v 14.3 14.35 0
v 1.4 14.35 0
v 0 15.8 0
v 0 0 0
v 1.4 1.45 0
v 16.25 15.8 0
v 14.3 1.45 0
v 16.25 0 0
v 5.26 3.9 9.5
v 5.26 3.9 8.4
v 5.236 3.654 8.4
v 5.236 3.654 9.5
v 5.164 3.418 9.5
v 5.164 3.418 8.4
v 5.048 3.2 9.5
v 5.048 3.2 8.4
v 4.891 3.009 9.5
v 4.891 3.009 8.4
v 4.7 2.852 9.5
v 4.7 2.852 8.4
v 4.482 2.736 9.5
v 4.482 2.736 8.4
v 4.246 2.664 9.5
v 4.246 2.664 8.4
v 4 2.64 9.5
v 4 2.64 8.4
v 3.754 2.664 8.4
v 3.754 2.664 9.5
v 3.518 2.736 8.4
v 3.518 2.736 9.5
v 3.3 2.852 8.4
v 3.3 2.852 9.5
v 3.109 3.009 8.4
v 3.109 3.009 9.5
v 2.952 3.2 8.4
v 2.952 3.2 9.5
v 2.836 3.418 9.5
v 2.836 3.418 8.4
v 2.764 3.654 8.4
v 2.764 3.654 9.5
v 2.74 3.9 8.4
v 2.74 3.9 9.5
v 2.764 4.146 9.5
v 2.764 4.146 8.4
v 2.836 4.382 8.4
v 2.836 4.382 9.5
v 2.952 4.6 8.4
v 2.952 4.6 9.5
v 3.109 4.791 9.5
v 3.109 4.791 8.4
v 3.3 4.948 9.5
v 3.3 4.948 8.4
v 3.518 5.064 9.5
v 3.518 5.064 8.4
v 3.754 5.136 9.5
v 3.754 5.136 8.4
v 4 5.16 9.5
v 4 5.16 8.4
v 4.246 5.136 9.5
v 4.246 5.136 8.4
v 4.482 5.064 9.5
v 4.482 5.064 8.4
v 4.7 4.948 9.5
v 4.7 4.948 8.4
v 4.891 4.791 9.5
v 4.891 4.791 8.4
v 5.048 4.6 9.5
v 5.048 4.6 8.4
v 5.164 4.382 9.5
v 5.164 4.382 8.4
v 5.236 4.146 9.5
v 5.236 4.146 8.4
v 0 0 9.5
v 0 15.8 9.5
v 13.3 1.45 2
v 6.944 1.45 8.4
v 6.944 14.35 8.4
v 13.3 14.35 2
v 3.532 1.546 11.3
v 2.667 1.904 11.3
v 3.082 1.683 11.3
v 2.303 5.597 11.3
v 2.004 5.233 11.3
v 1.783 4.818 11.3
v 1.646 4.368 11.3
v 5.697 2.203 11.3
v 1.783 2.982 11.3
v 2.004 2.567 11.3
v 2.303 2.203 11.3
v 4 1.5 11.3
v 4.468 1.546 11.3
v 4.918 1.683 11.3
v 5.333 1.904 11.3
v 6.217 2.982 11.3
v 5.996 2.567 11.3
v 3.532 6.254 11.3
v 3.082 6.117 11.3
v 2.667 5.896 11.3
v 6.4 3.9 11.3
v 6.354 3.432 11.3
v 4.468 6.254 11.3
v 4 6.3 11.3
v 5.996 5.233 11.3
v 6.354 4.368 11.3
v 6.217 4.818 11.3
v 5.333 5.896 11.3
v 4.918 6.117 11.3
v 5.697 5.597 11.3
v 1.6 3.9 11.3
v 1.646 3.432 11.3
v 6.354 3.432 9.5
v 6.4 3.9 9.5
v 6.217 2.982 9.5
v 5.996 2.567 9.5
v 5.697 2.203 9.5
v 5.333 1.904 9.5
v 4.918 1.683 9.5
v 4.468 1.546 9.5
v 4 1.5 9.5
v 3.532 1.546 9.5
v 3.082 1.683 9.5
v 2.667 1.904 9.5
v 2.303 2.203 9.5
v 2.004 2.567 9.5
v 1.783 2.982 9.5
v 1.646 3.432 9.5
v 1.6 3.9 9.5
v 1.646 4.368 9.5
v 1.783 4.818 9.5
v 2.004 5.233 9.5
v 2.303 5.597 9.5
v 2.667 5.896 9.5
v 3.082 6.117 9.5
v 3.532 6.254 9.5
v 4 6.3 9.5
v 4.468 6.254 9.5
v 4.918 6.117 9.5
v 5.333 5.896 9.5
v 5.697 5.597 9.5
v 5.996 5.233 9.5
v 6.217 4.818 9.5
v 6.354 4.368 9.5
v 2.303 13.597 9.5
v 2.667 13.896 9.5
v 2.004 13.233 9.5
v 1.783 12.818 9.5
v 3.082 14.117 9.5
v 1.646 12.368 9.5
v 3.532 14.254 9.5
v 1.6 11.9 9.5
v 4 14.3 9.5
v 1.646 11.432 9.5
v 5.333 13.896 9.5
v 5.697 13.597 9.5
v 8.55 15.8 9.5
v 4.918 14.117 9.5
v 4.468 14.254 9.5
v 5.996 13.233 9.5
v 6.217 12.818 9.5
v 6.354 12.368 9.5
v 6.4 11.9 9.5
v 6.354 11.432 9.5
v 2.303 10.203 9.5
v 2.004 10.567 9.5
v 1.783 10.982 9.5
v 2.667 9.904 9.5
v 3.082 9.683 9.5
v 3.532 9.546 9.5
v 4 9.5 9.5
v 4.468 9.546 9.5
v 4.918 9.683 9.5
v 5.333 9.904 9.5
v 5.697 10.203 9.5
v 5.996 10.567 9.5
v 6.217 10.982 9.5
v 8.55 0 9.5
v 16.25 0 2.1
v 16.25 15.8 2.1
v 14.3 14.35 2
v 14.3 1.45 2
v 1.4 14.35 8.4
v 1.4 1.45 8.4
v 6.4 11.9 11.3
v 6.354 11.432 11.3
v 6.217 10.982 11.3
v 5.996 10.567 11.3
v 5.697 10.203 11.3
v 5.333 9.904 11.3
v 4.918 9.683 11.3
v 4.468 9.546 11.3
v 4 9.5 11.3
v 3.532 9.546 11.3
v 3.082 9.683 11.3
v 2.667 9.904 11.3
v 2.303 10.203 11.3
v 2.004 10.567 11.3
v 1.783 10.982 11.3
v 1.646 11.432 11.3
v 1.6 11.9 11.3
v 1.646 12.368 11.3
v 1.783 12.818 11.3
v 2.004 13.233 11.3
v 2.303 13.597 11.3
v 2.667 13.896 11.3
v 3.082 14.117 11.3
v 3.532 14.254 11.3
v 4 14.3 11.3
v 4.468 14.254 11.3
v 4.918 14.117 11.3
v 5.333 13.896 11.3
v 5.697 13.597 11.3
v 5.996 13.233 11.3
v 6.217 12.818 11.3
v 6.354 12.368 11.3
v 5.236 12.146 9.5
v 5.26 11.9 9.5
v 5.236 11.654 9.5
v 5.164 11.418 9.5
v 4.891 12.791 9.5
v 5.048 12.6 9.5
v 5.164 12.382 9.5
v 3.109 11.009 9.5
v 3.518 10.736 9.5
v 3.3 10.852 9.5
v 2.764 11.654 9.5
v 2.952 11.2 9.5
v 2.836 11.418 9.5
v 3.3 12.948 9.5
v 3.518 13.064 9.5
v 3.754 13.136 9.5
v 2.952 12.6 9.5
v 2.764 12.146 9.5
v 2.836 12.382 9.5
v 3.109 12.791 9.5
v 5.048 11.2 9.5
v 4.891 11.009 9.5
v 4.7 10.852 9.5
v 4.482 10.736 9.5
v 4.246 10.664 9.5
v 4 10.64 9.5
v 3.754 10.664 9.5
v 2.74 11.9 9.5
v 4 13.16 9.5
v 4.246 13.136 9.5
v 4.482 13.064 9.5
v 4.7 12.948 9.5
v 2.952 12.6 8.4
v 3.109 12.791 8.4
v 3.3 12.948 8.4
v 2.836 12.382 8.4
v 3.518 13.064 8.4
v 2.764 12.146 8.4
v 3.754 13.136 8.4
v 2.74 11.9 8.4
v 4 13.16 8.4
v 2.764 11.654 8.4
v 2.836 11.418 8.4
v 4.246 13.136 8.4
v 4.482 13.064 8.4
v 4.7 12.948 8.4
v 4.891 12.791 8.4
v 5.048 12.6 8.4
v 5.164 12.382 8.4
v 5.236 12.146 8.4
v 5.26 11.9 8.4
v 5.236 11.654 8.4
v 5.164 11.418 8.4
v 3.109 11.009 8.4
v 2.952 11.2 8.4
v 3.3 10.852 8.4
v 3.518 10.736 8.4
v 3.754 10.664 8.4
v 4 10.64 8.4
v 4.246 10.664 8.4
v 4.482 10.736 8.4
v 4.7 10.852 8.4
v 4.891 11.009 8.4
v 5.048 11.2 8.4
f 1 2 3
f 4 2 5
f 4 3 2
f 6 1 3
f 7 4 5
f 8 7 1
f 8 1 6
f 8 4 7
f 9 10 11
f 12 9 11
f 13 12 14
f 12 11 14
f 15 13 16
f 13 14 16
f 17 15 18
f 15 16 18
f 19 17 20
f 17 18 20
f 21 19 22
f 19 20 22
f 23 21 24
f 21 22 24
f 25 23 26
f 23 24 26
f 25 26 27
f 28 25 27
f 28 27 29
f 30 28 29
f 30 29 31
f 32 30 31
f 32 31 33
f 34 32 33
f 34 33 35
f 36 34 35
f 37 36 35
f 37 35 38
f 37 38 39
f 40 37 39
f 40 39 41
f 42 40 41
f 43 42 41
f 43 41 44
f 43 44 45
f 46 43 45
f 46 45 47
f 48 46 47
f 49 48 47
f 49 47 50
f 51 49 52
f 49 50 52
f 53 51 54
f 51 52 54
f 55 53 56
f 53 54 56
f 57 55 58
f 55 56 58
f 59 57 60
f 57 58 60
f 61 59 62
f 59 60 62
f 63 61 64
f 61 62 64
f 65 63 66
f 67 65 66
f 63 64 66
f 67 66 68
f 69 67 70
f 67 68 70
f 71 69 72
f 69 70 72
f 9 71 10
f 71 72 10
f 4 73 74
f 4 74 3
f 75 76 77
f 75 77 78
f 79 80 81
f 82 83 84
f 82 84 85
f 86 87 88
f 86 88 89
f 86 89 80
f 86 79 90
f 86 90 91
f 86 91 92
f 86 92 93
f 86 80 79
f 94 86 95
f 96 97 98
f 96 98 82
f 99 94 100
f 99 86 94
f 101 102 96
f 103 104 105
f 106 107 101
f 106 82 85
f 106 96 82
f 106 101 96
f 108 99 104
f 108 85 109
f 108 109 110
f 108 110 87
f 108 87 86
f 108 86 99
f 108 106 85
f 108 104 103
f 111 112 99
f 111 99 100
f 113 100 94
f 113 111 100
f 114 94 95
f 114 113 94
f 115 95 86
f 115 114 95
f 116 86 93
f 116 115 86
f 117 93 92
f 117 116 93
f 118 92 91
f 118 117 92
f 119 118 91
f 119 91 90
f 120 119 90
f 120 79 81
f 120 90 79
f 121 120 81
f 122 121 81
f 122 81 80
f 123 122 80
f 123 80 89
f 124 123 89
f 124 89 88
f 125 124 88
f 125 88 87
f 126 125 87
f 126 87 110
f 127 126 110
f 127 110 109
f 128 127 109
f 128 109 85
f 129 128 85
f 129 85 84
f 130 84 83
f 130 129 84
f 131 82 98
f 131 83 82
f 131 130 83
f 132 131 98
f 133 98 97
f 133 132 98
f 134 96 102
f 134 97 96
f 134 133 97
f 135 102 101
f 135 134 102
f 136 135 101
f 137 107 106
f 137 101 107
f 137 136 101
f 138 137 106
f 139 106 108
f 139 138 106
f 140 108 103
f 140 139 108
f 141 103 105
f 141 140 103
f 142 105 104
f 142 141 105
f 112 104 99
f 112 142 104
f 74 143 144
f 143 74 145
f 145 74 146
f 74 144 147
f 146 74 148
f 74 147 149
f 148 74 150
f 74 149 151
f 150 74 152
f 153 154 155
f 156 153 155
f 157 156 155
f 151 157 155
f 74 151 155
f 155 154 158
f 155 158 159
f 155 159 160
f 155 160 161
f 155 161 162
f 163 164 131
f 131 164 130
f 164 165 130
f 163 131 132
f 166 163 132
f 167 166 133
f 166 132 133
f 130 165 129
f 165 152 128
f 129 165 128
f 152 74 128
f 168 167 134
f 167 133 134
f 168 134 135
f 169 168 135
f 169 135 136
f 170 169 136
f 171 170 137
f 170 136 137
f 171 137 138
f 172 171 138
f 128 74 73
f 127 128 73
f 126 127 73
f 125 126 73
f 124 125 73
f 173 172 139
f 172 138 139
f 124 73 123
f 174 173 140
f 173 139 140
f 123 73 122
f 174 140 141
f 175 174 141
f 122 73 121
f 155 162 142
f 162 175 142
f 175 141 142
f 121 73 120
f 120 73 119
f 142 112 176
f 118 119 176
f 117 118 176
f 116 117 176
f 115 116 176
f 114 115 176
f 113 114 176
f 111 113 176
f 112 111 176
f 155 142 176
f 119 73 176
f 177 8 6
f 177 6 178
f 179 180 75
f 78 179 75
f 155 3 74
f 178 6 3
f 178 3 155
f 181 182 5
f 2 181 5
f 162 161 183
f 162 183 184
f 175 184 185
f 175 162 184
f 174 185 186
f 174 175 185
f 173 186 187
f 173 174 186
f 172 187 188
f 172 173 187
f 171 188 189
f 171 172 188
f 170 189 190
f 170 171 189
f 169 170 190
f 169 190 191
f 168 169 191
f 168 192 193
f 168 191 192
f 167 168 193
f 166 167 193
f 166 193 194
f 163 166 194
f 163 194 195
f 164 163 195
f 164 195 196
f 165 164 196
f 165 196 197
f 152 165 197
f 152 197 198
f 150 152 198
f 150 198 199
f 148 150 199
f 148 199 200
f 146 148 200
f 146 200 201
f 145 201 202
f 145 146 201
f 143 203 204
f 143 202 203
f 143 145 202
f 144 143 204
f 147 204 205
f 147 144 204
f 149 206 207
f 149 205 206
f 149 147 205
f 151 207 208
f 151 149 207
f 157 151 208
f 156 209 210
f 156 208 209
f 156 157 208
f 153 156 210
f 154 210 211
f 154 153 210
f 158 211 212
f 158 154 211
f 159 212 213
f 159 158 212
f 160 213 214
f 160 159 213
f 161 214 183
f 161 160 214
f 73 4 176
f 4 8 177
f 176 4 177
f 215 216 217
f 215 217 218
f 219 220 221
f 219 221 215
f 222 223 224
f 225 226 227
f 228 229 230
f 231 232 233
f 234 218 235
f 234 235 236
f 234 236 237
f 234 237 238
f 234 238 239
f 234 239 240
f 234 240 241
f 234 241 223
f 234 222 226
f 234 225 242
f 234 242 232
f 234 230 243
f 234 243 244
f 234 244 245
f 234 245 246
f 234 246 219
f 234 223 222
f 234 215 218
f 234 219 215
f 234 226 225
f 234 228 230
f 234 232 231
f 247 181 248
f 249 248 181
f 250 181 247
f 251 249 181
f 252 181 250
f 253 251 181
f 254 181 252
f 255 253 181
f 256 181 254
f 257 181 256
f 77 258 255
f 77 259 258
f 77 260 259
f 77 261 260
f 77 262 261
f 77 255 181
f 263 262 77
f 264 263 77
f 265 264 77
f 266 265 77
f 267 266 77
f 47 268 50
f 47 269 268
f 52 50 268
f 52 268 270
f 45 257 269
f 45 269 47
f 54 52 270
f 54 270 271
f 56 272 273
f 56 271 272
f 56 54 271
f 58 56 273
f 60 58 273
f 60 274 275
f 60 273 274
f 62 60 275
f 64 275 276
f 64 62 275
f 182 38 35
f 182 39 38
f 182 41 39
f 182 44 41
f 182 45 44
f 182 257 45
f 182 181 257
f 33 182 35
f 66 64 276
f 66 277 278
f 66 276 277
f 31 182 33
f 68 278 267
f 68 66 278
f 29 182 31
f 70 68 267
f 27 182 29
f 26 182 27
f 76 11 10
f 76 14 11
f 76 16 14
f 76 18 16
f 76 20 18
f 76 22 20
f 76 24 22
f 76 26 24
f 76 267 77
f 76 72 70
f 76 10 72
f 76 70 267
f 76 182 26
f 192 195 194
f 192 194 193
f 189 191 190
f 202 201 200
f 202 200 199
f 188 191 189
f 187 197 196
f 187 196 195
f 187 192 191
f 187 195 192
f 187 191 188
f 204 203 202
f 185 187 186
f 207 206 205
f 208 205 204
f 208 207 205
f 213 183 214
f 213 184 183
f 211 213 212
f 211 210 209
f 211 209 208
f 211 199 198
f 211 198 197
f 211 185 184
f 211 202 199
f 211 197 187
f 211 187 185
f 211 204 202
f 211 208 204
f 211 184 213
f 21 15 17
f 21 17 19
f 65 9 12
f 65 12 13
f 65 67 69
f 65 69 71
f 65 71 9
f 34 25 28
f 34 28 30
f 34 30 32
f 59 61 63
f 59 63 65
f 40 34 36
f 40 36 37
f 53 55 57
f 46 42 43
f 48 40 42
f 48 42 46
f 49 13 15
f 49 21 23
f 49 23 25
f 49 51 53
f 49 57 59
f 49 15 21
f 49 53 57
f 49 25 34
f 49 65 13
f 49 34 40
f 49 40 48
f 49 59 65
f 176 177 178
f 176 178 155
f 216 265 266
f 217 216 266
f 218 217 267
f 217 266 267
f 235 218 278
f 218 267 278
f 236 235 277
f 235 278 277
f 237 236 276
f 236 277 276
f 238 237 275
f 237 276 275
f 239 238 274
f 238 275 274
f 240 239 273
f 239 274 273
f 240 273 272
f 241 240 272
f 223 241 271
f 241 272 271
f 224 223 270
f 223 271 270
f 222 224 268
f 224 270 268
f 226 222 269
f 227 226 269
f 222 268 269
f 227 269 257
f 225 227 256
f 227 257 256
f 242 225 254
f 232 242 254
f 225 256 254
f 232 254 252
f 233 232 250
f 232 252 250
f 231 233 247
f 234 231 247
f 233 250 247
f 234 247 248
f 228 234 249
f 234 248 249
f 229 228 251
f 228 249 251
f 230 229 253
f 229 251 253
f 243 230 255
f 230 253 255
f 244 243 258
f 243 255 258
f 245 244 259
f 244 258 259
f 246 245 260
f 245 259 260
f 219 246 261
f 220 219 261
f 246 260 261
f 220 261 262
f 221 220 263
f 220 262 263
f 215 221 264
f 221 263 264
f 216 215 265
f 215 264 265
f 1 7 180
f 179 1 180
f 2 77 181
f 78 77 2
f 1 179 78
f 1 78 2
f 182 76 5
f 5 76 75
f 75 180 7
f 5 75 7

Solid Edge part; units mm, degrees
sketch "Sketch1" plane through (0, 0, 0) normal (0, -1, 0) x (1, 0, 0)
  line L0 (0, 9.5) -> (8.55, 9.5)
  line L1 (16.25, 2.1) -> (8.55, 9.5)
  line L2 (16.25, 0) -> (16.25, 2.1)
  line L3 (0, 0) -> (16.25, 0)
  line L4 (0, 9.5) -> (0, 0)
  dimension "D1" = 8.55
  dimension "D2" = 2.1
extrude "Protrusion1" add sketch "Sketch1" against normal blind 15.8
sketch "Sketch2" plane through (8.125, 1.45, 4.75) normal (0, -1, 0) x (1, 0, 0)
  line L0 (6.175, -4.75) -> (6.175, -2.75)
  line L1 (6.175, -2.75) -> (5.175, -2.75)
  line L2 (-1.1815, 3.65) -> (5.175, -2.75)
  line L3 (-6.725, 3.65) -> (-1.1815, 3.65)
  line L4 (-6.725, 3.65) -> (-6.725, -4.75)
  line L5 (-6.725, -4.75) -> (6.175, -4.75)
  dimension "D1" = 2
  dimension "D2" = 1
extrude "ExtrudedCutout_1" cut sketch "Sketch2" against normal blind 12.9
sketch "Sketch3" plane through (4.275, 7.9, 9.5) normal (0, 0, 1) x (1, 0, 0)
  circle A0 centre (-0.275, 4) radius 2.4
  circle A1 centre (-0.275, -4) radius 2.4
  dimension "D1" = 4.8
  dimension "D2" = 4.8
extrude "ExtrudedProtrusion_2" add sketch "Sketch3" along normal blind 1.8
sketch "Sketch4" plane through (4.1717, 7.9, 8.4) normal (0, 0, -1) x (1, 0, 0)
  circle A0 centre (-0.1717, -4) radius 1.26
  circle A1 centre (-0.1717, 4) radius 1.26
  dimension "D1" = 2.52
  dimension "D2" = 2.52
extrude "Cutout1" cut sketch "Sketch4" against normal up to vertex (1.1 mm away)
